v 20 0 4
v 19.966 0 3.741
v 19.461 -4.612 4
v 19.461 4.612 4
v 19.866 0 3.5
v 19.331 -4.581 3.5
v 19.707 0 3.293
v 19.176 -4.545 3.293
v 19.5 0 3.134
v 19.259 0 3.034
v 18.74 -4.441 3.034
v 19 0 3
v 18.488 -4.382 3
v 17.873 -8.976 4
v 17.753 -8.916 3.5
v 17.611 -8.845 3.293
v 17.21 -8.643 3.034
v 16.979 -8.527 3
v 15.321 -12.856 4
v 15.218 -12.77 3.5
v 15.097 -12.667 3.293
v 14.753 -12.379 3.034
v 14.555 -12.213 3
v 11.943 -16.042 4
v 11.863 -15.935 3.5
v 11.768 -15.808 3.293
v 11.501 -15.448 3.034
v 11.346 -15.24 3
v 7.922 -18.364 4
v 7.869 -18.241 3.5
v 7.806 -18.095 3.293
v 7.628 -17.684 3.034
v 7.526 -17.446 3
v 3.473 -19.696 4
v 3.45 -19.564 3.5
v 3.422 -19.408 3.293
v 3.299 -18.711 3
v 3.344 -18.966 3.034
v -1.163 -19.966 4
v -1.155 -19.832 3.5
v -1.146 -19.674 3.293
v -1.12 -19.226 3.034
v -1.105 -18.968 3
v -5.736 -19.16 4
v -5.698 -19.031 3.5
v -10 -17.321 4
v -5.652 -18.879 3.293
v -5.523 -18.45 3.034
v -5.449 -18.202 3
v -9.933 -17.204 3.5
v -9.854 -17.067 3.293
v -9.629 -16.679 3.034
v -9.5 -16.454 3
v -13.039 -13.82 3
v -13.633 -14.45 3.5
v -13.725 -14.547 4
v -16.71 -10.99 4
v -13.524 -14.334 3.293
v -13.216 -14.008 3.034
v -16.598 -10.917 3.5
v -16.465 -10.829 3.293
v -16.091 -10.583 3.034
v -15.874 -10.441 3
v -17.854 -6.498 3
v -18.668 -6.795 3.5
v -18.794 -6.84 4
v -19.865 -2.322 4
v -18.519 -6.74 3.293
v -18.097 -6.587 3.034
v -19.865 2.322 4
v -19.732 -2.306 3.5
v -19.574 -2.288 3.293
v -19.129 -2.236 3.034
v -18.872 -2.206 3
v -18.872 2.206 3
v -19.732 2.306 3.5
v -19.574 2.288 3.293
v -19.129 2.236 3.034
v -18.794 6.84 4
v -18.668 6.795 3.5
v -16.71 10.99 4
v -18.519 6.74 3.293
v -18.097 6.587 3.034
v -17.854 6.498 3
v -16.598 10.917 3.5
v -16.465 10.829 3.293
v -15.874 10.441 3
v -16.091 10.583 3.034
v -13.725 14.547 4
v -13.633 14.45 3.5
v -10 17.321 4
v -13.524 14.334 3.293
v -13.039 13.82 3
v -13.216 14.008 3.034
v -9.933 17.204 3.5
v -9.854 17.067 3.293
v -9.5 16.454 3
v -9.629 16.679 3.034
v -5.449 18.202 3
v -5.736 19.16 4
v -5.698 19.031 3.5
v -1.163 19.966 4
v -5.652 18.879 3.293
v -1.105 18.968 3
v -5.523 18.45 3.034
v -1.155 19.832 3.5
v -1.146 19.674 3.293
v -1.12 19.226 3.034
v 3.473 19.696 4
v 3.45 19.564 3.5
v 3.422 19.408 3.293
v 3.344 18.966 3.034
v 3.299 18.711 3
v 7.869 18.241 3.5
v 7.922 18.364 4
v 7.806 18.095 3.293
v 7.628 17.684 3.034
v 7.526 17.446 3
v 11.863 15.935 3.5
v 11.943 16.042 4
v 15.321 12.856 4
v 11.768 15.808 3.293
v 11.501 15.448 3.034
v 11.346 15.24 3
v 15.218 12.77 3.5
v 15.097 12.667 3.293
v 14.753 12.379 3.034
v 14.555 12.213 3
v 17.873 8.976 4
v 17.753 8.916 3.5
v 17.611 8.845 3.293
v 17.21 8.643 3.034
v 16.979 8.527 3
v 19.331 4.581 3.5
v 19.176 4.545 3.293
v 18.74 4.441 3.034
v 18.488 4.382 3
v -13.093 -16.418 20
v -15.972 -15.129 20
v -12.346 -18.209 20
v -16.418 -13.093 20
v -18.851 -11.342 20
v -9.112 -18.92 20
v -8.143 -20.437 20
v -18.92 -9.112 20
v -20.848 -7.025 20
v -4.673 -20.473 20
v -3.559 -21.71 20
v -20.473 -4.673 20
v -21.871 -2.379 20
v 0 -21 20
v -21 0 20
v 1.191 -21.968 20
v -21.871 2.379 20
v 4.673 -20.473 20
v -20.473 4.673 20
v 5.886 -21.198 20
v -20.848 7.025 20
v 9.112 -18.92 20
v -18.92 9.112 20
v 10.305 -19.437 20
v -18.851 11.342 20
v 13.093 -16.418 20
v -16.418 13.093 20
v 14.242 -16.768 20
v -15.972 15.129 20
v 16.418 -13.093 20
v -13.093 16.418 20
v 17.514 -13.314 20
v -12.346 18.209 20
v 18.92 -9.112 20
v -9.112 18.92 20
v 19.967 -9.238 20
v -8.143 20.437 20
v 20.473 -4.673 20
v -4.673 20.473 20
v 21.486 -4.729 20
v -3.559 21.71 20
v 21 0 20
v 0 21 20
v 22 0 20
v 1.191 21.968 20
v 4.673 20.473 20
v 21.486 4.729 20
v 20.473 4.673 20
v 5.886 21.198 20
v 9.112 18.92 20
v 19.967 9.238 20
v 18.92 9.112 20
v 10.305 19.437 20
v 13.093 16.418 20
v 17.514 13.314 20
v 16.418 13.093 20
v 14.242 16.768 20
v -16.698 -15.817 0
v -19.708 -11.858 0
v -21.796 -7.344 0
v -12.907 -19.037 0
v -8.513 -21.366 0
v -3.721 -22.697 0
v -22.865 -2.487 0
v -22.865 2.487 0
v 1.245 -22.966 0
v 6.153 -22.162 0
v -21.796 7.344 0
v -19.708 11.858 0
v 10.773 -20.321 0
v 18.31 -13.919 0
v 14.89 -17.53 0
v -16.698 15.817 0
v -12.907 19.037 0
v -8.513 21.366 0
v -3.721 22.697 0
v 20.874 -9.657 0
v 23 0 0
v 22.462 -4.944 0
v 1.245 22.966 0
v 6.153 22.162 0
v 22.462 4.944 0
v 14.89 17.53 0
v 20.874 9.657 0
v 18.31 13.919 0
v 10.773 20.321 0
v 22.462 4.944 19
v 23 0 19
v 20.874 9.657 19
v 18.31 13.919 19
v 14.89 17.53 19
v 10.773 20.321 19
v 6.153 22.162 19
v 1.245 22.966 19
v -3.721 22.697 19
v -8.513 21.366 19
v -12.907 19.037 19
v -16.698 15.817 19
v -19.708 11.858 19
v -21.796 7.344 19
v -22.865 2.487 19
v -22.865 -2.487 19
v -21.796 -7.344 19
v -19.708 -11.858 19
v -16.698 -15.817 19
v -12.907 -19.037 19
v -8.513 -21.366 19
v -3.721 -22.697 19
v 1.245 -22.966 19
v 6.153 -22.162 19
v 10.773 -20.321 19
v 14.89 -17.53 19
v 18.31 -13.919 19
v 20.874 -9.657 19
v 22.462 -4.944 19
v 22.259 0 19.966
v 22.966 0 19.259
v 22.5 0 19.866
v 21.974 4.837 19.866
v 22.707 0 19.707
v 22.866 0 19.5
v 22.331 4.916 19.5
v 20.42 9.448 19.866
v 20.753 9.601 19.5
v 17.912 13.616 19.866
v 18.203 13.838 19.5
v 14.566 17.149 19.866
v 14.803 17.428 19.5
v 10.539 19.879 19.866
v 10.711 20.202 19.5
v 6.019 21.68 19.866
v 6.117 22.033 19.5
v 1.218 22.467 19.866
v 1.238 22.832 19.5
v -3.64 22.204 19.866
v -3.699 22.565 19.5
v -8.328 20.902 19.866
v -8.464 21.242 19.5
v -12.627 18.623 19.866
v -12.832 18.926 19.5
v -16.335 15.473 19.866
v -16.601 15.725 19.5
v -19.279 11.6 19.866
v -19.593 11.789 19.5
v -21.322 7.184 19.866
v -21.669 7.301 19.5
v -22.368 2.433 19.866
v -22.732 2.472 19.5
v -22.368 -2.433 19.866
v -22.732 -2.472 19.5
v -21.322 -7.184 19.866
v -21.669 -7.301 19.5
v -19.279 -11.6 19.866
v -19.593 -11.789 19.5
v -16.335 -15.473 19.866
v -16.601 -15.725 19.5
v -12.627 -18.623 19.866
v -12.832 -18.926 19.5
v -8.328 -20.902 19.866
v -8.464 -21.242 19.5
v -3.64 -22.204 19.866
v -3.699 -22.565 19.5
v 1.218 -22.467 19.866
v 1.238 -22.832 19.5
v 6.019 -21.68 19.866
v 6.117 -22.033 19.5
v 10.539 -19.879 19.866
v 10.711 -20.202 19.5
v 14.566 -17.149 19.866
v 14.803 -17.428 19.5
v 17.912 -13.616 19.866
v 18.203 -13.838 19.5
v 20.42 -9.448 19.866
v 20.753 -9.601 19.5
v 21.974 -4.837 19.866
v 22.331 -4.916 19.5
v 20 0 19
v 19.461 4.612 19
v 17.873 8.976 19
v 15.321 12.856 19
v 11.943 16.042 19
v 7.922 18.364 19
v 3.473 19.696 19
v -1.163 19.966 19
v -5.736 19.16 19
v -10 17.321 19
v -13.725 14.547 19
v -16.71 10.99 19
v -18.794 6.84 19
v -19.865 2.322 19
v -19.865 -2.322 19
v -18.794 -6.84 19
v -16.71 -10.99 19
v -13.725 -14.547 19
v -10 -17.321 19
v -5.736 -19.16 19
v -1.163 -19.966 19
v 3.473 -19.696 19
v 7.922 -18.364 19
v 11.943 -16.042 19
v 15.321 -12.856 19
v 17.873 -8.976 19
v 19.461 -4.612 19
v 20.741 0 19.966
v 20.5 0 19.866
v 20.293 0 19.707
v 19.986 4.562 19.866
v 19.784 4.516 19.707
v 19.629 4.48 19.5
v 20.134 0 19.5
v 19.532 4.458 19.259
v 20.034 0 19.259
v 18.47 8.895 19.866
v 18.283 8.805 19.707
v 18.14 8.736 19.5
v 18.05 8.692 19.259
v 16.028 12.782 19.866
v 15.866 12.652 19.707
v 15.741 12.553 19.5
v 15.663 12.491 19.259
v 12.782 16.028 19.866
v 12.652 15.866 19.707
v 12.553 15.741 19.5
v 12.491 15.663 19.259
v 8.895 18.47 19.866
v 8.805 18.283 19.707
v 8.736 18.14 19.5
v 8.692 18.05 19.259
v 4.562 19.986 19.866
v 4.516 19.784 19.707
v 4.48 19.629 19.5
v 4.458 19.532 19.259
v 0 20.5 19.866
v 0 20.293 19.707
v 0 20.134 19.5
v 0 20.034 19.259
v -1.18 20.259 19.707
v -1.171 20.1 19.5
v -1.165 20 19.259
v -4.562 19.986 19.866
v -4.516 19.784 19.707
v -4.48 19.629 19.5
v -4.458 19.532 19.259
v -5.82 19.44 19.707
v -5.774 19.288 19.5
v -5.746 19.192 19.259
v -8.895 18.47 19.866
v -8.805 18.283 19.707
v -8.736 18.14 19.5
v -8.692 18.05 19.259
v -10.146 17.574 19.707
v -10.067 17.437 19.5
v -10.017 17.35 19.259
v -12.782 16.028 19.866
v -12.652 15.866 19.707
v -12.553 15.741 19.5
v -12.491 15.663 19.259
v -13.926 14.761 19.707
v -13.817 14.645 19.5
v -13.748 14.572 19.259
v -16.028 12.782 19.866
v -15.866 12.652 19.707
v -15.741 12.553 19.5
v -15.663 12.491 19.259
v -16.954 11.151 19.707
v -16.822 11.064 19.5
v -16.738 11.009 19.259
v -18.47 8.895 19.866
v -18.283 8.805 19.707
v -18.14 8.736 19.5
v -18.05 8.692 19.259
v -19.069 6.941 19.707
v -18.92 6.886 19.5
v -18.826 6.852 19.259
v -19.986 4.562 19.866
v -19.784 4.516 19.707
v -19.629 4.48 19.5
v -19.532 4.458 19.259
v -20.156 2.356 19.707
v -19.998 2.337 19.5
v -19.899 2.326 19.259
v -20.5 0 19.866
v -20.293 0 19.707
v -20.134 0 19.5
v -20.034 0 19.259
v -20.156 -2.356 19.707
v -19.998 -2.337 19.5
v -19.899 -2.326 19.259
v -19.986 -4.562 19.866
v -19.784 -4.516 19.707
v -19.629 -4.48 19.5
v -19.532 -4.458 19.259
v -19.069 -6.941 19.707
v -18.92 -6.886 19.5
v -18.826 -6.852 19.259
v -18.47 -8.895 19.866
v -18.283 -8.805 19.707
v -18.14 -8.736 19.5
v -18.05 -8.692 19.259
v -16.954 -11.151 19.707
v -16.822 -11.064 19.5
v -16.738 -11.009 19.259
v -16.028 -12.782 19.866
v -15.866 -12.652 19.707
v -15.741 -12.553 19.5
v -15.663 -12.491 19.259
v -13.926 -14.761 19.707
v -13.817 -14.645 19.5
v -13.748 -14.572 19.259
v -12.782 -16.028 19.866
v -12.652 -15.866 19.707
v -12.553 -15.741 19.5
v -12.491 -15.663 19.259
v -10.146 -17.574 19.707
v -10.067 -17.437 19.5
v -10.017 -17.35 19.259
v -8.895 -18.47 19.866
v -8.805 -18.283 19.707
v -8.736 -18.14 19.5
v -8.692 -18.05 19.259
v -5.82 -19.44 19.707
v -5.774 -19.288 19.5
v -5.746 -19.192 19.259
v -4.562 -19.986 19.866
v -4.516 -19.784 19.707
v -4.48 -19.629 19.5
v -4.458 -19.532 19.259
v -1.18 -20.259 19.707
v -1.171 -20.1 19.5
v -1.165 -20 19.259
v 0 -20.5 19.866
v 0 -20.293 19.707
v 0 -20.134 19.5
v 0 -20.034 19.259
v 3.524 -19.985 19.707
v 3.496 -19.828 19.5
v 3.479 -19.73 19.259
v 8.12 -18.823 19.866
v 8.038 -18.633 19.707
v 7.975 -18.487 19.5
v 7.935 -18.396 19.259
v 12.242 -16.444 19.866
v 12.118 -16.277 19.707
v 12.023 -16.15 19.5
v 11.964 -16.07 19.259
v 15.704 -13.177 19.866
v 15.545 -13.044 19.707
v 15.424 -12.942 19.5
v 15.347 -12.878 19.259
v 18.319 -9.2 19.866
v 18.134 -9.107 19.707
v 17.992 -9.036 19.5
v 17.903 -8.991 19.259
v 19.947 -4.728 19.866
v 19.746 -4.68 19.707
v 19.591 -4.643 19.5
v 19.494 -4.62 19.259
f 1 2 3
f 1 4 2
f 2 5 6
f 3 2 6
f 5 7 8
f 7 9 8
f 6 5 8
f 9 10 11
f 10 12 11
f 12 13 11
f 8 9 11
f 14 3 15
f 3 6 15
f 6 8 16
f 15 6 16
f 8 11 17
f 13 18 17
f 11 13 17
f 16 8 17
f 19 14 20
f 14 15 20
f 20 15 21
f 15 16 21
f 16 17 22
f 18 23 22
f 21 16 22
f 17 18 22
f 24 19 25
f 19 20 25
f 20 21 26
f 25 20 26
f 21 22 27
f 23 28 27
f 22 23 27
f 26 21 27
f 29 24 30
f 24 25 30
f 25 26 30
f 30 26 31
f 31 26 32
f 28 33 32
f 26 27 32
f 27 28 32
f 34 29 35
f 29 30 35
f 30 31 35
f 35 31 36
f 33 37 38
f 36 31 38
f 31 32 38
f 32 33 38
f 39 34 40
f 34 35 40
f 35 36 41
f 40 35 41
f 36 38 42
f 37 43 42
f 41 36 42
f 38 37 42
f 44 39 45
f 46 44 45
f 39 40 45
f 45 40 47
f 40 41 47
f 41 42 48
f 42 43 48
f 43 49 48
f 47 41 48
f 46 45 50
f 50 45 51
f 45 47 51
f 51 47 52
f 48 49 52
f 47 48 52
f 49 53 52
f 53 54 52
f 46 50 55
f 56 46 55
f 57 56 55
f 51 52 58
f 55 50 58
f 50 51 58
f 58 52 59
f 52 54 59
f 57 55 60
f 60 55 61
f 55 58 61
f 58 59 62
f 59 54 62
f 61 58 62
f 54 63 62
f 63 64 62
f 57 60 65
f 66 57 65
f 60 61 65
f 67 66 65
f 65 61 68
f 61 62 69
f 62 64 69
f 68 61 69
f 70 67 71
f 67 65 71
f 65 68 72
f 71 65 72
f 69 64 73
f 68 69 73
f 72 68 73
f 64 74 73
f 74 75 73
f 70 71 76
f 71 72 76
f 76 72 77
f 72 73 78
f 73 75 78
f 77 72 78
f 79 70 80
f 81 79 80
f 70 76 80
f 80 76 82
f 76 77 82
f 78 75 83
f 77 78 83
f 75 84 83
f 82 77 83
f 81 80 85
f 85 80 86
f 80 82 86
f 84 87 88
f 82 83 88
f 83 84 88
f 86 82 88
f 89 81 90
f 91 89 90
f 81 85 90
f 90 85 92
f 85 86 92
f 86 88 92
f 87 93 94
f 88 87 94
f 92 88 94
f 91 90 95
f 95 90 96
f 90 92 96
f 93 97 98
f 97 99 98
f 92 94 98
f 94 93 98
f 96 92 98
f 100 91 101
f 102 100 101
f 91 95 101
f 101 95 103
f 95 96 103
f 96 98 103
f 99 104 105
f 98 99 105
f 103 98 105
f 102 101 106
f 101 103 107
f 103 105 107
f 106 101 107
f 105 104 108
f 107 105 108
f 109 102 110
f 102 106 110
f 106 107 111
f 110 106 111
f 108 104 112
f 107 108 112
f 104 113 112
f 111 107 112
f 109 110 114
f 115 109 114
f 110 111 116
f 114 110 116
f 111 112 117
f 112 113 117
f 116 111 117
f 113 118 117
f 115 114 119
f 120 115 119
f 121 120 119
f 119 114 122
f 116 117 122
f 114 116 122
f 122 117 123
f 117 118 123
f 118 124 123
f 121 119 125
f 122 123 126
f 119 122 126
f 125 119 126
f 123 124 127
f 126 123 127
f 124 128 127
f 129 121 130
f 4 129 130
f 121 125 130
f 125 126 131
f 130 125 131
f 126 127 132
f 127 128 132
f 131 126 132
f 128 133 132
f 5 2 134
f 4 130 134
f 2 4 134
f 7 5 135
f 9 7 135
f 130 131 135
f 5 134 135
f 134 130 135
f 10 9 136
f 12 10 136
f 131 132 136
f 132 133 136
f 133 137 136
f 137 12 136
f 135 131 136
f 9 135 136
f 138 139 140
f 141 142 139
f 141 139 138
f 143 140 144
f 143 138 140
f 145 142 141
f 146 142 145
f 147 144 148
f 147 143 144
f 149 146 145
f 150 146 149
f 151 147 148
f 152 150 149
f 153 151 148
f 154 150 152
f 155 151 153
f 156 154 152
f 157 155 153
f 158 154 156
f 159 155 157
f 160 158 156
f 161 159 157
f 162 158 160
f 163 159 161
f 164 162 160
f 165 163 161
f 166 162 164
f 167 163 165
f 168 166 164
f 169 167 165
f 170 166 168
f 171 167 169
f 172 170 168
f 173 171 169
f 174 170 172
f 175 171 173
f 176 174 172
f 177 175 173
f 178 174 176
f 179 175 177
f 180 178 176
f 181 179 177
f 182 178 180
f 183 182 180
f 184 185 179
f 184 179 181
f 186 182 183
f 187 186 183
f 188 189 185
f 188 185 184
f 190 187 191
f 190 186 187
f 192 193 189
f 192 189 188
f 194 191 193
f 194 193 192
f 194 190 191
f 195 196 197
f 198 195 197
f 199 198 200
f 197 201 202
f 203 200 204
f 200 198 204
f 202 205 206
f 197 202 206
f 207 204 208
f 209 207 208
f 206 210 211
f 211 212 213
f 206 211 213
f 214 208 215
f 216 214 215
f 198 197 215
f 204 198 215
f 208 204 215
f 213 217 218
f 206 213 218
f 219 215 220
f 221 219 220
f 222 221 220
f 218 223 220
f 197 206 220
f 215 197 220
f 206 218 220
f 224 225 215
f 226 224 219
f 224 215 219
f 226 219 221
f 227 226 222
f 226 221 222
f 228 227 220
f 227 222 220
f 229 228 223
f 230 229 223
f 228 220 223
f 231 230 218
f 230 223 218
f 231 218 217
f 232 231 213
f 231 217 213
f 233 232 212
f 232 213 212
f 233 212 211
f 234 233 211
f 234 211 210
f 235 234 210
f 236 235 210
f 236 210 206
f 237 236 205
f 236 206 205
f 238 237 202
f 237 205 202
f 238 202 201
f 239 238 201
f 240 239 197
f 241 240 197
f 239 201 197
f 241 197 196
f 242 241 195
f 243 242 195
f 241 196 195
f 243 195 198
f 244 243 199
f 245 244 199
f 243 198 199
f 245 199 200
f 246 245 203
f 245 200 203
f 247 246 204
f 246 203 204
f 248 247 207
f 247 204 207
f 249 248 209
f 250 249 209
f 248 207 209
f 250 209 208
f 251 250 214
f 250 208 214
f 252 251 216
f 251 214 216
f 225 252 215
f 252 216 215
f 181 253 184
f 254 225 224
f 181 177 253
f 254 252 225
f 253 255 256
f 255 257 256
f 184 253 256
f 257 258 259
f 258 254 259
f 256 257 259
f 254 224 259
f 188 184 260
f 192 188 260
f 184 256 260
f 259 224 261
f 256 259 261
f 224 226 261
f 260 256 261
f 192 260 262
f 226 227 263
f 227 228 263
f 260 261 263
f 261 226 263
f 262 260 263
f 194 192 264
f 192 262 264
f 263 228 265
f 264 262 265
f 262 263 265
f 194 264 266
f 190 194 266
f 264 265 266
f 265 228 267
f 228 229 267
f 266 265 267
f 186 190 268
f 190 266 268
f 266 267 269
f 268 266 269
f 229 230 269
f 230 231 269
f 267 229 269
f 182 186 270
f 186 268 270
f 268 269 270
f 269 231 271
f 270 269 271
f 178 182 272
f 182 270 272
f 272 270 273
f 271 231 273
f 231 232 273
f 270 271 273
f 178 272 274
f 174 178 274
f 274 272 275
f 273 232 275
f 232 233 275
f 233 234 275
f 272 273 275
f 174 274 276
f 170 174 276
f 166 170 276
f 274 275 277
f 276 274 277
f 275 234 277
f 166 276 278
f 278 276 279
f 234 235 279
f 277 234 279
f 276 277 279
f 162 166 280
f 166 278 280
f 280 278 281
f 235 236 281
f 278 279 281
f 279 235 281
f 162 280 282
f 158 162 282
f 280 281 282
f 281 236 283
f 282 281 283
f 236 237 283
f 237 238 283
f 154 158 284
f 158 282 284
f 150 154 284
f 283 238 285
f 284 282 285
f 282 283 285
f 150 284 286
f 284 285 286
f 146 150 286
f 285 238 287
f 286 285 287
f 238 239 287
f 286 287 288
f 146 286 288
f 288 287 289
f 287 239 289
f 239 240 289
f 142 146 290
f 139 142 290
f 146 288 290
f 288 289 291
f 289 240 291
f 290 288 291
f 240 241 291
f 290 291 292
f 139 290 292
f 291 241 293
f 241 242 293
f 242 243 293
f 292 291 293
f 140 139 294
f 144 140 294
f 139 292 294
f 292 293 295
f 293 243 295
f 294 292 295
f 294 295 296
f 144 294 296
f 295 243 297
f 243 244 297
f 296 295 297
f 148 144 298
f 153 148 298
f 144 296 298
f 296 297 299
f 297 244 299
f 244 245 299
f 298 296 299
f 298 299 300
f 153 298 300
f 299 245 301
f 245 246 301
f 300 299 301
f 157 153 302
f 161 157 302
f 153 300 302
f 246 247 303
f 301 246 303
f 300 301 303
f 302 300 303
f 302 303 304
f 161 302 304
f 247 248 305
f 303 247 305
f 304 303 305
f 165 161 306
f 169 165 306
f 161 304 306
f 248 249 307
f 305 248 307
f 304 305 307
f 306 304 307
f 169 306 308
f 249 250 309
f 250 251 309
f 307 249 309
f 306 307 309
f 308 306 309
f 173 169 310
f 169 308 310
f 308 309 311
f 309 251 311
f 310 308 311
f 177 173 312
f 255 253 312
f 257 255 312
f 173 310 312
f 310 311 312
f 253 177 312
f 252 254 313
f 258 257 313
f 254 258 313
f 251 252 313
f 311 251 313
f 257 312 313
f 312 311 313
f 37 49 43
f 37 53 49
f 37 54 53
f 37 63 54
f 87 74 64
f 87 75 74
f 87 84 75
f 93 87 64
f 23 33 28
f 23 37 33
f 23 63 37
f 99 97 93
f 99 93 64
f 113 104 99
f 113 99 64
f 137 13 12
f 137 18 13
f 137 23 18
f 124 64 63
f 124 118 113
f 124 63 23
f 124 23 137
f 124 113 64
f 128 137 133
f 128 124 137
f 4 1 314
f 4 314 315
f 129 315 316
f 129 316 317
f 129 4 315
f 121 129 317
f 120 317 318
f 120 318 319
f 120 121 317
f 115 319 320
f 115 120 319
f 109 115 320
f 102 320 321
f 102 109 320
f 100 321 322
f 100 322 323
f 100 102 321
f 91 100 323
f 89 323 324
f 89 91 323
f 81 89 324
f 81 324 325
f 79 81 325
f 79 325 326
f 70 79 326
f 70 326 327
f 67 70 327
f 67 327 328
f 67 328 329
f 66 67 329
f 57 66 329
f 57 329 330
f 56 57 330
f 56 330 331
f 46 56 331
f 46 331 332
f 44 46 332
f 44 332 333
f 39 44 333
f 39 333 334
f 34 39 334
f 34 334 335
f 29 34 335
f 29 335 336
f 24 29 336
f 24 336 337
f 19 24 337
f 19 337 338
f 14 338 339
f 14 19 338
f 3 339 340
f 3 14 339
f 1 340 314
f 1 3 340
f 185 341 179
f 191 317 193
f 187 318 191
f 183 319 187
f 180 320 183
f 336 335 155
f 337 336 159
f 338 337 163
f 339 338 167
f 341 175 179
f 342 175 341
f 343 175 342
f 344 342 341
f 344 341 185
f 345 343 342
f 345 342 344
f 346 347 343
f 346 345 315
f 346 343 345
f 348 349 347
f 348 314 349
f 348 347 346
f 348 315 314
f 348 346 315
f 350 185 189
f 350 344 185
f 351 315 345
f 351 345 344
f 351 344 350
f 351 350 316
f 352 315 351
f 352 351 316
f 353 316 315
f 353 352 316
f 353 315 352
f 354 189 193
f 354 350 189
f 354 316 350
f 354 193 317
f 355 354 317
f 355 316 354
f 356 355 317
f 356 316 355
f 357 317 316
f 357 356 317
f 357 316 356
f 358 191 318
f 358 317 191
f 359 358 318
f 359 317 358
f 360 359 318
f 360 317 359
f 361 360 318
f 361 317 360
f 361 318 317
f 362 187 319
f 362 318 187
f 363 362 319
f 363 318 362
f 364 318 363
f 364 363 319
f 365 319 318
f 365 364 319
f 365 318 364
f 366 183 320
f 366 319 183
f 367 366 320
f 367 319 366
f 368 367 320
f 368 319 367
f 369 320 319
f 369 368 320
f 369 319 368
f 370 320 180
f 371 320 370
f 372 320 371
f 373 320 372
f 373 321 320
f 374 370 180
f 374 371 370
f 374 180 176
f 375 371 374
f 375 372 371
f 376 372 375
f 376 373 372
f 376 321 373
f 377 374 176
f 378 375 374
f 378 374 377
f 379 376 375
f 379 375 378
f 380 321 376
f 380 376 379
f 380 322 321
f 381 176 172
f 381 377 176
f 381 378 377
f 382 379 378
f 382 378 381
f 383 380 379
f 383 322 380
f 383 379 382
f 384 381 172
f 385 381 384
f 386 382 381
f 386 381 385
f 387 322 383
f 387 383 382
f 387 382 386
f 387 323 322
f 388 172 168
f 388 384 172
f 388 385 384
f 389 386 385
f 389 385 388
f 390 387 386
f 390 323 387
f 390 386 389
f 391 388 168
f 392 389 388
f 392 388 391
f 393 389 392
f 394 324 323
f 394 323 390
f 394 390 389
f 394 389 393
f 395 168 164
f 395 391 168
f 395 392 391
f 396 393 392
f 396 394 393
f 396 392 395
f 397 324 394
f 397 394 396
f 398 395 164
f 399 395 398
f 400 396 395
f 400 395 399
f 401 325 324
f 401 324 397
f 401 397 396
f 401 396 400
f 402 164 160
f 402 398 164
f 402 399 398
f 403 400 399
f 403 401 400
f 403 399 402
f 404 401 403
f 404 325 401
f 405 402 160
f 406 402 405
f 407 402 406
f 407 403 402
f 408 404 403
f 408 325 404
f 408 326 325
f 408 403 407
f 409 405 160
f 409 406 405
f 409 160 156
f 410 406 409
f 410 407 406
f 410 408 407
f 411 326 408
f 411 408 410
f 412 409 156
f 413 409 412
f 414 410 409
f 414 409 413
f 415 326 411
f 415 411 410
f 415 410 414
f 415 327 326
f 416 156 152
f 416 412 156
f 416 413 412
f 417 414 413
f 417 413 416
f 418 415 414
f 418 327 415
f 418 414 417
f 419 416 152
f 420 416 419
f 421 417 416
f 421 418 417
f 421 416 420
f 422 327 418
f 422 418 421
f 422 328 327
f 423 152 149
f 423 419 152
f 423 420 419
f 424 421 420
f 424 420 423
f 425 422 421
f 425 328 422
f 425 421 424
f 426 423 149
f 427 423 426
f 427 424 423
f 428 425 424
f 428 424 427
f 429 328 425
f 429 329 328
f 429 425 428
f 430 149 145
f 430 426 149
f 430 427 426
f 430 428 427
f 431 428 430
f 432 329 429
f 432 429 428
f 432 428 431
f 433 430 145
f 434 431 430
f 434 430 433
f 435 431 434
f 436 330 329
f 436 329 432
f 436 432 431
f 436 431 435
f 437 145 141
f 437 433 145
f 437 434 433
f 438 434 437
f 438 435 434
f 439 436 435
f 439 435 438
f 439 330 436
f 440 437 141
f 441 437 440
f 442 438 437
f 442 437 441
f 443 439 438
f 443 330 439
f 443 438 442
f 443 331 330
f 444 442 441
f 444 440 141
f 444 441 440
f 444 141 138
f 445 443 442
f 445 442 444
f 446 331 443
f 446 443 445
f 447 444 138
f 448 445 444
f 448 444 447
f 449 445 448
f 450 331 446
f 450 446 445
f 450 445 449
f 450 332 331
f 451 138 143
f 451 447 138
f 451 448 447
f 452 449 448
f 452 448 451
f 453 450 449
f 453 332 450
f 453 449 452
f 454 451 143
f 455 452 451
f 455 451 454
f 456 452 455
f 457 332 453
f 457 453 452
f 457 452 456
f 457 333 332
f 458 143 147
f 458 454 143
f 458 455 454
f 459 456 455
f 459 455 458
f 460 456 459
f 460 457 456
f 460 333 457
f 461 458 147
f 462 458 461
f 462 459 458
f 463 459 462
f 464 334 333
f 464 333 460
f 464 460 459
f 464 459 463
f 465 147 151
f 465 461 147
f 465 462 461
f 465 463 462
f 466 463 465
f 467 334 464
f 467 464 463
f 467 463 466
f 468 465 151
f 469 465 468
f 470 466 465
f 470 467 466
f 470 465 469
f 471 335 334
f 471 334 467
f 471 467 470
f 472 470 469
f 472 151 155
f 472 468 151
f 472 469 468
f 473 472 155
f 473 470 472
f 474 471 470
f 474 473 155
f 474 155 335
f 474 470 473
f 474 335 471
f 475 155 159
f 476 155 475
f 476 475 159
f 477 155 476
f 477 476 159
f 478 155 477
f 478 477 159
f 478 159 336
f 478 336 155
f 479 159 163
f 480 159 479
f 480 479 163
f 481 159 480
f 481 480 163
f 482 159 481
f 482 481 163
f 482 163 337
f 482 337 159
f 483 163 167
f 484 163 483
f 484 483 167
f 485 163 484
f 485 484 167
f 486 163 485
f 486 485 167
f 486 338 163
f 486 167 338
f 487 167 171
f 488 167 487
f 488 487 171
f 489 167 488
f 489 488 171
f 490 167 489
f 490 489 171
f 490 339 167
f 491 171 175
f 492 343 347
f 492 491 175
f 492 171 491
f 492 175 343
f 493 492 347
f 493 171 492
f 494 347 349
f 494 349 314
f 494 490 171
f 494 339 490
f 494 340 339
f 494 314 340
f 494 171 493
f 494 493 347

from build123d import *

# Parameters (mm, degrees)
F0_R     = 23
F0_R_2   = 20
F1_DEPTH = 20
F2_R     = 23
F3_DEPTH = 3
F4_R     = 1
F5_R     = 1
F6_R     = 1


with BuildPart() as f1:
    # F0 (on Top) → F1 (new body)
    with BuildSketch(Plane.XY):
        Circle(F0_R)
        Circle(F0_R_2, mode=Mode.SUBTRACT)
    extrude(amount=F1_DEPTH)

    # F2 (on Top) → F3 (join)
    with BuildSketch(Plane.XY):
        Circle(F2_R)
    extrude(amount=F3_DEPTH)

    # F4
    f4_edges = [f1.edges().sort_by_distance(p)[0] for p in [
        (-20, 0, 20),
    ]]
    fillet(f4_edges, radius=F4_R)

    # F5
    f5_edges = [f1.edges().sort_by_distance(p)[0] for p in [
        (-23, 0, 20),
    ]]
    fillet(f5_edges, radius=F5_R)

    # F6
    f6_edges = [f1.edges().sort_by_distance(p)[0] for p in [
        (-20, 0, 3),
    ]]
    fillet(f6_edges, radius=F6_R)


solid = f1.part
